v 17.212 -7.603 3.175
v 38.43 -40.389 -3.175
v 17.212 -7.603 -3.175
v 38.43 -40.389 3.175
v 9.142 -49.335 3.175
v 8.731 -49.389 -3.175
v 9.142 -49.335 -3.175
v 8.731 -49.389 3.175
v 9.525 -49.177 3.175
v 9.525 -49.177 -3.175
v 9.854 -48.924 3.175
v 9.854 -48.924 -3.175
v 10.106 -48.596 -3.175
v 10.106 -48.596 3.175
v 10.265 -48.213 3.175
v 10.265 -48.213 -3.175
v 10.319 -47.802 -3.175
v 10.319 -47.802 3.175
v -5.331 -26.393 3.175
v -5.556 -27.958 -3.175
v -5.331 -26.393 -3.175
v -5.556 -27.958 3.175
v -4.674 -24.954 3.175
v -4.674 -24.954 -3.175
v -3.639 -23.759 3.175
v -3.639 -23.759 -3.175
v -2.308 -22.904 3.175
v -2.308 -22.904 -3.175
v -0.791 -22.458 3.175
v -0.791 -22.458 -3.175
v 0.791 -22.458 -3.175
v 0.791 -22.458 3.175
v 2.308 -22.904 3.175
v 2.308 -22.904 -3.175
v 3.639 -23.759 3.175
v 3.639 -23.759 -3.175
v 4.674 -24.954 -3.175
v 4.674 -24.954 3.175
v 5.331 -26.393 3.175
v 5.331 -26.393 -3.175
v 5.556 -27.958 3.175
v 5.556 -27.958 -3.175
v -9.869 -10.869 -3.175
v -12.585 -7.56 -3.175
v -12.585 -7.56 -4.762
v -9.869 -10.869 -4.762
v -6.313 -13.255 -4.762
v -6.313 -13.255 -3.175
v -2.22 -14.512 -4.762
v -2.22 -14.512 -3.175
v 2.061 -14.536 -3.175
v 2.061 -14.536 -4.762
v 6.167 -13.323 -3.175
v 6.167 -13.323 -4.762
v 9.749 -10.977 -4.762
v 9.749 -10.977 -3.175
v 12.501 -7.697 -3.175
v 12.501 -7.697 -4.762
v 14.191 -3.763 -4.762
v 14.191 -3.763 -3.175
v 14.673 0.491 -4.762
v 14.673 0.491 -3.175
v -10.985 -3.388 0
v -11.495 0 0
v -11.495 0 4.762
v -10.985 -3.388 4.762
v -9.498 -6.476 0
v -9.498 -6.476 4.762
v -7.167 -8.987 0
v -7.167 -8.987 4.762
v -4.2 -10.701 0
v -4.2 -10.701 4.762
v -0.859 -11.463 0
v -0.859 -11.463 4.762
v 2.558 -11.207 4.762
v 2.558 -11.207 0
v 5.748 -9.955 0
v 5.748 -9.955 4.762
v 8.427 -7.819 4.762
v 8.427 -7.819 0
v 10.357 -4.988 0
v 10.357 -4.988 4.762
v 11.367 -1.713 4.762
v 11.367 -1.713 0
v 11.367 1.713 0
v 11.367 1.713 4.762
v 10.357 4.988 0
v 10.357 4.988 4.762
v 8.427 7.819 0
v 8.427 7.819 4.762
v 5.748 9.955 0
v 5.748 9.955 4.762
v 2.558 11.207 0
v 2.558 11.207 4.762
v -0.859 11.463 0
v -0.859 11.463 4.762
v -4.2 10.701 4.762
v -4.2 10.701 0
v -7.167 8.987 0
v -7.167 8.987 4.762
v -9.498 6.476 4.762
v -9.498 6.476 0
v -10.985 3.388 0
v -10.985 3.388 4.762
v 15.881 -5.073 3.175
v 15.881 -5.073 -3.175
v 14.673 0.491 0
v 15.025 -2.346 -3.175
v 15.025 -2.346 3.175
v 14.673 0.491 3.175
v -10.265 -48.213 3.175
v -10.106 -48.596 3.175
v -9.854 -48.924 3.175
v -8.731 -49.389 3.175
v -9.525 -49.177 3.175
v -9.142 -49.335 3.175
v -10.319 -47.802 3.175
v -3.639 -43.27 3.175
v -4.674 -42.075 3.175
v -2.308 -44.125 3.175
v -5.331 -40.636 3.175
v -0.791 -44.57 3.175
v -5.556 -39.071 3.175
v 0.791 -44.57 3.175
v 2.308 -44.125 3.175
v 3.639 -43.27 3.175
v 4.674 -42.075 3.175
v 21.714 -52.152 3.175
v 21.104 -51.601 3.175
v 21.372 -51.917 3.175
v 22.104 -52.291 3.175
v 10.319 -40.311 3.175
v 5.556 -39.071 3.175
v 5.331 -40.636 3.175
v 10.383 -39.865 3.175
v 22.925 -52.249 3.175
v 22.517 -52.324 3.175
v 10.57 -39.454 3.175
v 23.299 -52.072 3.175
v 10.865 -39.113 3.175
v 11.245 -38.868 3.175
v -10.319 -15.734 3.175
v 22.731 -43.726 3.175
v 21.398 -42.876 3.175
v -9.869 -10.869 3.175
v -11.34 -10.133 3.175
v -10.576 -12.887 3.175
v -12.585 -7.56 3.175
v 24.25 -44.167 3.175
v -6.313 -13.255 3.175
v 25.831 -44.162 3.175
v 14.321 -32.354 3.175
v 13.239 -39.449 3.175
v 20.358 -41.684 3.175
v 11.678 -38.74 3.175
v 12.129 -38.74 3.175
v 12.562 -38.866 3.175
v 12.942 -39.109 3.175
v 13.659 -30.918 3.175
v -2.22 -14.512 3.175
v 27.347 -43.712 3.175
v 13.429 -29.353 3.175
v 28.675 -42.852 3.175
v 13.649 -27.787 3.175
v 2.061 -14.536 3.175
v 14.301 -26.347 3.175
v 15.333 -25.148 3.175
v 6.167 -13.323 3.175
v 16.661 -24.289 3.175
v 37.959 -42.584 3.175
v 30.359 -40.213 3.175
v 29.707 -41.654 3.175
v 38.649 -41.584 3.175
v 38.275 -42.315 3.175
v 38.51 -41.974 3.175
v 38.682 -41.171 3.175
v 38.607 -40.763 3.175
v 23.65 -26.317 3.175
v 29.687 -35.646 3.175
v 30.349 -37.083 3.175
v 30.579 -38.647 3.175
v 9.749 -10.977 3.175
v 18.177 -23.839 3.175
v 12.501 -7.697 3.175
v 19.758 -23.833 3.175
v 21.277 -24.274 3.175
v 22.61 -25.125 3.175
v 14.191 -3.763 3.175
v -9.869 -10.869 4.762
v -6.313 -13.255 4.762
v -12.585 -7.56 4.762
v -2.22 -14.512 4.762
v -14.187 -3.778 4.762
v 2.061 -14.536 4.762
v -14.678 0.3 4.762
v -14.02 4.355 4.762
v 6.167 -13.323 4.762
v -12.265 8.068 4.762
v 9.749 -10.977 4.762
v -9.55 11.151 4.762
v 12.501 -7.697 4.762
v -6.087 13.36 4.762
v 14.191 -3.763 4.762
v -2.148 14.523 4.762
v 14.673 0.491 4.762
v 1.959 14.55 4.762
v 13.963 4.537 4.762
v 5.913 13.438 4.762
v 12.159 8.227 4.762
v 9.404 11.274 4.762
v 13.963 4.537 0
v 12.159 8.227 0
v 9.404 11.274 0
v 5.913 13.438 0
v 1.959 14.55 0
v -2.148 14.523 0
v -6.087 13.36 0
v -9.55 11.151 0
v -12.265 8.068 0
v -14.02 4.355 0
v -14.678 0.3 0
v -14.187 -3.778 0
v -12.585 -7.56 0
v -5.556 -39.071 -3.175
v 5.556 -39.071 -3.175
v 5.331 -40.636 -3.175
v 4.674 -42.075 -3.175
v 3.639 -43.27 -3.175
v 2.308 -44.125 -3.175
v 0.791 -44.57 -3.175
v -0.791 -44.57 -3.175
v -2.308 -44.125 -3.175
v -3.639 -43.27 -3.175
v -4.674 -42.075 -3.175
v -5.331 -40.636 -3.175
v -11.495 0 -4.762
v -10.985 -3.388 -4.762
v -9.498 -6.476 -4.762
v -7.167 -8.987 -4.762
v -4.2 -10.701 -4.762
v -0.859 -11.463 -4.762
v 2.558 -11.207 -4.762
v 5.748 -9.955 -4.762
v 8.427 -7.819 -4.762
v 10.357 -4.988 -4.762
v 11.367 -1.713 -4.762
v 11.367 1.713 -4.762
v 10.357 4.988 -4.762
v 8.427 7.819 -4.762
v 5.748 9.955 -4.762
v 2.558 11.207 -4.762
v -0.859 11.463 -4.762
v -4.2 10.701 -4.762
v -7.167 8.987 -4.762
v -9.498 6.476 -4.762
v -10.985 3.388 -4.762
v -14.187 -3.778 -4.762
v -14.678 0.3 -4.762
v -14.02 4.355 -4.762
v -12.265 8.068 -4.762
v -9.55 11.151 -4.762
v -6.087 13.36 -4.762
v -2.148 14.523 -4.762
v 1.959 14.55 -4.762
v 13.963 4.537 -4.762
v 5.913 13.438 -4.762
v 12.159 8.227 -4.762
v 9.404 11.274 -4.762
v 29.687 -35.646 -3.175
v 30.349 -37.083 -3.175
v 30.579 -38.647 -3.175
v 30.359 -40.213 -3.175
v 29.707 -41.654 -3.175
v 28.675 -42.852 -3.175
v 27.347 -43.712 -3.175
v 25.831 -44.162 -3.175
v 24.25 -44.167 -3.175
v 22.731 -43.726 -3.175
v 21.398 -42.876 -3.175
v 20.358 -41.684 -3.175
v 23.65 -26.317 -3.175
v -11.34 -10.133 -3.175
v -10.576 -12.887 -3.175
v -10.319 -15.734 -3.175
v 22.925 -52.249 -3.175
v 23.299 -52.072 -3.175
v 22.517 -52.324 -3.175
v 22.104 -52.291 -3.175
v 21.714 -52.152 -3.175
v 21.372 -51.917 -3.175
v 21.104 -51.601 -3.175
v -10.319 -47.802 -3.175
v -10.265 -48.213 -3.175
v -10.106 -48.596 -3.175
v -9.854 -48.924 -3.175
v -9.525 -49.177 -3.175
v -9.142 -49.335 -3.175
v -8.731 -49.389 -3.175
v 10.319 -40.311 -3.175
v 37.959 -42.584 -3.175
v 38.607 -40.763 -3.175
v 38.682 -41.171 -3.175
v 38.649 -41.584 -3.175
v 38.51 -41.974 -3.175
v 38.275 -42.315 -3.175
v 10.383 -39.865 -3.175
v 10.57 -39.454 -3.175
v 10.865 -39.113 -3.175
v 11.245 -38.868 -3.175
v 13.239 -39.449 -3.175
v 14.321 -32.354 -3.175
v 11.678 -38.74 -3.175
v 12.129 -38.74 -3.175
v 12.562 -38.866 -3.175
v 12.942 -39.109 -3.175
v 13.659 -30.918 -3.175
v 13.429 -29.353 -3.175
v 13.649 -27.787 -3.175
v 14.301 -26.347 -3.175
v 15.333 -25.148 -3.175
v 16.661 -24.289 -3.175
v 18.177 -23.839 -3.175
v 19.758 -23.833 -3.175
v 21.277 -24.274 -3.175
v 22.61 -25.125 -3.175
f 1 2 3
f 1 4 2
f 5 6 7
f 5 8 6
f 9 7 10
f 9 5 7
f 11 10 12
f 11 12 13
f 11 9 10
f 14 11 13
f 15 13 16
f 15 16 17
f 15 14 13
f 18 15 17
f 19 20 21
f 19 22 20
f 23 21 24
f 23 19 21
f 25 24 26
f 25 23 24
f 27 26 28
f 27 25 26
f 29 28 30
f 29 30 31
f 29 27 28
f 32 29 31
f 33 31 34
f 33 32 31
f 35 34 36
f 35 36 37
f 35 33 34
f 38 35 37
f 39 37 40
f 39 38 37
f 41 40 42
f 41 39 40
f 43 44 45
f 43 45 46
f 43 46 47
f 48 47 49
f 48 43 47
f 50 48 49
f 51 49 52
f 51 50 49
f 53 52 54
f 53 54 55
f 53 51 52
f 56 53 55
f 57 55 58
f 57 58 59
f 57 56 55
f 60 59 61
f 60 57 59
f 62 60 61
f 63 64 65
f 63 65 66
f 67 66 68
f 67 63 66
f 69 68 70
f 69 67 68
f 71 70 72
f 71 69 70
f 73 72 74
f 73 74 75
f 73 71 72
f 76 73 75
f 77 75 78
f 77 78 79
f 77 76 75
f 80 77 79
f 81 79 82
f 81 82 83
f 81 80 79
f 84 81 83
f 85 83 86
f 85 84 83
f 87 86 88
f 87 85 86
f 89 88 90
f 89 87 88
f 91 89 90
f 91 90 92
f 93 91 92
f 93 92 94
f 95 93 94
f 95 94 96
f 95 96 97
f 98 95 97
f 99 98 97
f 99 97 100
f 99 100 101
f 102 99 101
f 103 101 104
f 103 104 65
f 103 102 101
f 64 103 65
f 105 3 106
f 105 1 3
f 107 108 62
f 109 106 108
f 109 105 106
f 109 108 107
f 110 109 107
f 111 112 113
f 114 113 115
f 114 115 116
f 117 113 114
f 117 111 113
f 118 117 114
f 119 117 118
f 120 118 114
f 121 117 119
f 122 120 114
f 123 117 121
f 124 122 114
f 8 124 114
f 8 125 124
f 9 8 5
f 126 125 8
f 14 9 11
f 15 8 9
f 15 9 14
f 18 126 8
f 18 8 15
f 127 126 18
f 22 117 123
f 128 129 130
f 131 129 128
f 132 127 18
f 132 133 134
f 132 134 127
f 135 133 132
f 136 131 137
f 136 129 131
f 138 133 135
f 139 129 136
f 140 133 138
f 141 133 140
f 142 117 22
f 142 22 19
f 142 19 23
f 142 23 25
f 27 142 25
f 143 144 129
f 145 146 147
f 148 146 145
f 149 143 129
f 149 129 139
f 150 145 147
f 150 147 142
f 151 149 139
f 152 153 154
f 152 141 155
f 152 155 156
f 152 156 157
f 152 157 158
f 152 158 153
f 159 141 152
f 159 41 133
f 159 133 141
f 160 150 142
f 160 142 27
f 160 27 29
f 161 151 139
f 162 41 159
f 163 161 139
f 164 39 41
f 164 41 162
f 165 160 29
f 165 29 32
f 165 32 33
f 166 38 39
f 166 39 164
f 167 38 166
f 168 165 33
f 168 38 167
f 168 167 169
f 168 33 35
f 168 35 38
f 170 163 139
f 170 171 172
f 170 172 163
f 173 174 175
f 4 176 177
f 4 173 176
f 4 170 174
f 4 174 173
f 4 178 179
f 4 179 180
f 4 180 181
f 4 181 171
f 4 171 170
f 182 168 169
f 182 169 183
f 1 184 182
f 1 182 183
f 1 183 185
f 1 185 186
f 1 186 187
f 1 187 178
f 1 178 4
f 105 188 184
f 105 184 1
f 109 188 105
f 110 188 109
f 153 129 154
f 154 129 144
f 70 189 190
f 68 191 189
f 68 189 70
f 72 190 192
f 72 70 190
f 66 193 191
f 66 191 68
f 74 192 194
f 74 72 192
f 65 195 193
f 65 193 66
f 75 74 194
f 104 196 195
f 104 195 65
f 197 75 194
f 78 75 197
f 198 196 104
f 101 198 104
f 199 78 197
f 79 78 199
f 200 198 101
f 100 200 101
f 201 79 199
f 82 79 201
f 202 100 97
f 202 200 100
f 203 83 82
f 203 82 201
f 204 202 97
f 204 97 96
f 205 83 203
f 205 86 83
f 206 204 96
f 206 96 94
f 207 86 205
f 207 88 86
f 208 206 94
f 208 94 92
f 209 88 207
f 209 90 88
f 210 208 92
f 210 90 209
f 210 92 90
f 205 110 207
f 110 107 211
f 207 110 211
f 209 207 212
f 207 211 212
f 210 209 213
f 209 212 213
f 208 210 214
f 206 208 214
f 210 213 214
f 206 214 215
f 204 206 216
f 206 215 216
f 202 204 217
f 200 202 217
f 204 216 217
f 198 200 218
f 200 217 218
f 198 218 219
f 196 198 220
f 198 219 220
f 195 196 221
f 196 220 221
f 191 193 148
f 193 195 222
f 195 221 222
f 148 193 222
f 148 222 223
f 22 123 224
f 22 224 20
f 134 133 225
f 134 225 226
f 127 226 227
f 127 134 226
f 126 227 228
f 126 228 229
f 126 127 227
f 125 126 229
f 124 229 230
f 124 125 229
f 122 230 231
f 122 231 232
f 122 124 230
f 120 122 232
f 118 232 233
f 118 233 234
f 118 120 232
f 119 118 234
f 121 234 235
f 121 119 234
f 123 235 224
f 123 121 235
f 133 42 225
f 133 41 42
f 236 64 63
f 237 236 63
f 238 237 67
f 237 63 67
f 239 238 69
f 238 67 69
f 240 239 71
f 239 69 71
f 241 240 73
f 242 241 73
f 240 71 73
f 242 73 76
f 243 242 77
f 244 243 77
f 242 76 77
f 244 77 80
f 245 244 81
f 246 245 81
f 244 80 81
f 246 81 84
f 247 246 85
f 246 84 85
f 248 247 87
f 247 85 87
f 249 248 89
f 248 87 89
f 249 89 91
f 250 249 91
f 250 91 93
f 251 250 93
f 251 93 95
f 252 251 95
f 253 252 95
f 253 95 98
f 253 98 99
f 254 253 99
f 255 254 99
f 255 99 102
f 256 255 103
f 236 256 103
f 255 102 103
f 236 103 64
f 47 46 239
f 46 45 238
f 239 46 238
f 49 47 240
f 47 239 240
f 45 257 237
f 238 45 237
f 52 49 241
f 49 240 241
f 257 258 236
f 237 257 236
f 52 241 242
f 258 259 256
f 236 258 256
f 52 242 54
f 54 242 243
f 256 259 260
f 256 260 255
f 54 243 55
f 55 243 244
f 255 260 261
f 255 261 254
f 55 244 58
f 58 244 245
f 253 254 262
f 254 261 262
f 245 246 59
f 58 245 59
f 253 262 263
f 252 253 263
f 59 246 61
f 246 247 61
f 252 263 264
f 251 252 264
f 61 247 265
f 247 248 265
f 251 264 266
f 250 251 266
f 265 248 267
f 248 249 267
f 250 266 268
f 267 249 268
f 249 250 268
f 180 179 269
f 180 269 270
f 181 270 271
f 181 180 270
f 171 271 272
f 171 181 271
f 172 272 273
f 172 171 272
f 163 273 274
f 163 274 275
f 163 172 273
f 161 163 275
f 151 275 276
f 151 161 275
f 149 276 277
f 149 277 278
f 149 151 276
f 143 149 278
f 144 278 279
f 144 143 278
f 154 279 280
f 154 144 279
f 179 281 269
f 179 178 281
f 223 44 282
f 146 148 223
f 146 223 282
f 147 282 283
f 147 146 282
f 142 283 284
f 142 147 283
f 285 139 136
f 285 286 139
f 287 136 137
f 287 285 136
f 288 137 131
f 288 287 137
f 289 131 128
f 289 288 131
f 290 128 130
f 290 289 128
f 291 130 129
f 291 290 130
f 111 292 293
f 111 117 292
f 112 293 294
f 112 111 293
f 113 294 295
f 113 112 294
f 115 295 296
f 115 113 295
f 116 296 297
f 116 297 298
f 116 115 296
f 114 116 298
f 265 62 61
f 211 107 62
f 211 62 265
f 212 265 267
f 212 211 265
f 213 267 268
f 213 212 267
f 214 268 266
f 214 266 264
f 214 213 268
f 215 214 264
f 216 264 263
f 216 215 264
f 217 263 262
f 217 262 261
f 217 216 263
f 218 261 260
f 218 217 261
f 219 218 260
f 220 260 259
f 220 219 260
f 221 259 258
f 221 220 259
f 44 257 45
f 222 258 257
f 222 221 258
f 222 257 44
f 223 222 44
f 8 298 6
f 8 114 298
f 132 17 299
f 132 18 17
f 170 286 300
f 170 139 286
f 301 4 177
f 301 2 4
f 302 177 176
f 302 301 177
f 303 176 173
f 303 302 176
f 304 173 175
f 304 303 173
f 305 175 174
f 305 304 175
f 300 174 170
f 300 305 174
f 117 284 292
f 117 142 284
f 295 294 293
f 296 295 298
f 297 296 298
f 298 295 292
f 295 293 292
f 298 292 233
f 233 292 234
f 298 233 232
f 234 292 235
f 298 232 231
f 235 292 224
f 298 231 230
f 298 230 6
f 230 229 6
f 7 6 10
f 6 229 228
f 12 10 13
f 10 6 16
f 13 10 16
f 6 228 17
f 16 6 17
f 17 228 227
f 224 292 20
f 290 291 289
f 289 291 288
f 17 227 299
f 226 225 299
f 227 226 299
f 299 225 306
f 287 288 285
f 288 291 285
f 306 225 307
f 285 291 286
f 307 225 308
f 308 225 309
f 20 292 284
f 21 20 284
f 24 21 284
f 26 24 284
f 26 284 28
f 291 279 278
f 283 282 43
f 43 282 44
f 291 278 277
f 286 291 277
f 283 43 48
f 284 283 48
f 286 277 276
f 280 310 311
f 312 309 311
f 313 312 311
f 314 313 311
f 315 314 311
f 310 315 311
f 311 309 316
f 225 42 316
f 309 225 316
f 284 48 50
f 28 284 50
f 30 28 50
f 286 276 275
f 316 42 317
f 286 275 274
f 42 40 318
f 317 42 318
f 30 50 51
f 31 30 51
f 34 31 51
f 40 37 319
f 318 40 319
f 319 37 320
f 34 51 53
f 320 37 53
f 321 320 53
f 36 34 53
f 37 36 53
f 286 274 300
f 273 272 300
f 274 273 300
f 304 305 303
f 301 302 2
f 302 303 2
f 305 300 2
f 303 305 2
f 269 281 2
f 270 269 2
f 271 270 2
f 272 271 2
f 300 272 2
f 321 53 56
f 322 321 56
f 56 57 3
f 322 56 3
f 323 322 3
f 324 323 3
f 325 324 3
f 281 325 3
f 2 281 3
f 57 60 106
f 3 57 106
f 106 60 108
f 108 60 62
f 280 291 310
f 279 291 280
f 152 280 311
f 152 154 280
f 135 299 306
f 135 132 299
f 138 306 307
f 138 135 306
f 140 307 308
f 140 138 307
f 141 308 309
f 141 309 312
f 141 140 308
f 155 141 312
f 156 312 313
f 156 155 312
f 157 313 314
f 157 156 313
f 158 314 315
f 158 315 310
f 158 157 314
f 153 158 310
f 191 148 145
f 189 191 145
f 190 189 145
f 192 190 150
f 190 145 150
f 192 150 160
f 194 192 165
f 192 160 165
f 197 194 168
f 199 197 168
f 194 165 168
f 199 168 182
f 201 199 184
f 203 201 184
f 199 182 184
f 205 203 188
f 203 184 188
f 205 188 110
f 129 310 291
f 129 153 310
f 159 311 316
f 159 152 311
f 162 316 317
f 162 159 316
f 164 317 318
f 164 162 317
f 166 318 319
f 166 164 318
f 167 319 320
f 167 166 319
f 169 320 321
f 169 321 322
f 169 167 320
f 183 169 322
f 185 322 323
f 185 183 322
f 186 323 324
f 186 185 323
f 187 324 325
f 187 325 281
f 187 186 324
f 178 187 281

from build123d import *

# Parameters (mm, degrees)
SKETCH1_R           = 11.495405
BOSS_EXTRUDE2_DEPTH = 4.7625
BOSS_EXTRUDE3_DEPTH = 3.175
FILLET1_R           = 1.5875


with BuildPart() as part:
    # Sketch1 → Boss-Extrude2 (new, symmetric)
    with BuildSketch(Plane.XY):
        with BuildLine():
            ThreePointArc((14.672983865, 0.491098707), (-4.158599684, 14.079903484), (-12.585193267, -7.559797873))
            ThreePointArc((-12.585193267, -7.559797873), (4.158599684, -14.079903484), (14.672983865, 0.491098707))
        make_face()
        Circle(SKETCH1_R, mode=Mode.SUBTRACT)
    extrude(amount=BOSS_EXTRUDE2_DEPTH, both=True)

    # Sketch1<4> → Boss-Extrude3 (add, symmetric)
    with BuildSketch(Plane.XY):
        with BuildLine():
            ThreePointArc((-12.585193267, -7.559797873), (-10.89585042, -11.492870345), (-10.31875, -15.734319794))
            Line((-10.31875, -15.734319794), (-10.31875, -49.389319794))
            Line((-10.31875, -49.389319794), (10.31875, -49.389319794))
            Line((10.31875, -49.389319794), (10.31875, -34.936520731))
            Line((10.31875, -34.936520731), (21.966281014, -52.934138627))
            Line((21.966281014, -52.934138627), (39.292025986, -41.721424085))
            Line((39.292025986, -41.721424085), (17.211603503, -7.603033986))
            ThreePointArc((17.211603503, -7.603033986), (15.391641433, -3.728672569), (14.672983865, 0.491098707))
            ThreePointArc((14.672983865, 0.491098707), (4.158599684, -14.079903484), (-12.585193267, -7.559797873))
        make_face()
        with BuildLine():
            ThreePointArc((5.55625, -39.070569794), (0, -44.626819794), (-5.55625, -39.070569794))
            Line((-5.55625, -39.070569794), (-5.55625, -27.958069794))
            ThreePointArc((-5.55625, -27.958069794), (0, -22.401819794), (5.55625, -27.958069794))
            Line((5.55625, -27.958069794), (5.55625, -39.070569794))
        make_face(mode=Mode.SUBTRACT)
        with BuildLine():
            ThreePointArc((29.687419875, -35.646101109), (28.04160399, -43.329532516), (20.358172583, -41.683716631))
            Line((20.358172583, -41.683716631), (14.32055706, -32.354469339))
            ThreePointArc((14.32055706, -32.354469339), (15.966372945, -24.671037931), (23.649804353, -26.316853816))
            Line((23.649804353, -26.316853816), (29.687419875, -35.646101109))
        make_face(mode=Mode.SUBTRACT)
    extrude(amount=BOSS_EXTRUDE3_DEPTH, both=True)

    # Fillet1
    fillet1_edges = [part.edges().sort_by_distance(p)[0] for p in [
        (-10.31875, -49.389319794, 0),
        (39.292025986, -41.721424085, 0),
        (10.31875, -49.389319794, 0),
        (21.966281014, -52.934138627, 0),
        (10.31875, -34.936520731, 0),
    ]]
    fillet(fillet1_edges, radius=FILLET1_R)


solid = part.part
